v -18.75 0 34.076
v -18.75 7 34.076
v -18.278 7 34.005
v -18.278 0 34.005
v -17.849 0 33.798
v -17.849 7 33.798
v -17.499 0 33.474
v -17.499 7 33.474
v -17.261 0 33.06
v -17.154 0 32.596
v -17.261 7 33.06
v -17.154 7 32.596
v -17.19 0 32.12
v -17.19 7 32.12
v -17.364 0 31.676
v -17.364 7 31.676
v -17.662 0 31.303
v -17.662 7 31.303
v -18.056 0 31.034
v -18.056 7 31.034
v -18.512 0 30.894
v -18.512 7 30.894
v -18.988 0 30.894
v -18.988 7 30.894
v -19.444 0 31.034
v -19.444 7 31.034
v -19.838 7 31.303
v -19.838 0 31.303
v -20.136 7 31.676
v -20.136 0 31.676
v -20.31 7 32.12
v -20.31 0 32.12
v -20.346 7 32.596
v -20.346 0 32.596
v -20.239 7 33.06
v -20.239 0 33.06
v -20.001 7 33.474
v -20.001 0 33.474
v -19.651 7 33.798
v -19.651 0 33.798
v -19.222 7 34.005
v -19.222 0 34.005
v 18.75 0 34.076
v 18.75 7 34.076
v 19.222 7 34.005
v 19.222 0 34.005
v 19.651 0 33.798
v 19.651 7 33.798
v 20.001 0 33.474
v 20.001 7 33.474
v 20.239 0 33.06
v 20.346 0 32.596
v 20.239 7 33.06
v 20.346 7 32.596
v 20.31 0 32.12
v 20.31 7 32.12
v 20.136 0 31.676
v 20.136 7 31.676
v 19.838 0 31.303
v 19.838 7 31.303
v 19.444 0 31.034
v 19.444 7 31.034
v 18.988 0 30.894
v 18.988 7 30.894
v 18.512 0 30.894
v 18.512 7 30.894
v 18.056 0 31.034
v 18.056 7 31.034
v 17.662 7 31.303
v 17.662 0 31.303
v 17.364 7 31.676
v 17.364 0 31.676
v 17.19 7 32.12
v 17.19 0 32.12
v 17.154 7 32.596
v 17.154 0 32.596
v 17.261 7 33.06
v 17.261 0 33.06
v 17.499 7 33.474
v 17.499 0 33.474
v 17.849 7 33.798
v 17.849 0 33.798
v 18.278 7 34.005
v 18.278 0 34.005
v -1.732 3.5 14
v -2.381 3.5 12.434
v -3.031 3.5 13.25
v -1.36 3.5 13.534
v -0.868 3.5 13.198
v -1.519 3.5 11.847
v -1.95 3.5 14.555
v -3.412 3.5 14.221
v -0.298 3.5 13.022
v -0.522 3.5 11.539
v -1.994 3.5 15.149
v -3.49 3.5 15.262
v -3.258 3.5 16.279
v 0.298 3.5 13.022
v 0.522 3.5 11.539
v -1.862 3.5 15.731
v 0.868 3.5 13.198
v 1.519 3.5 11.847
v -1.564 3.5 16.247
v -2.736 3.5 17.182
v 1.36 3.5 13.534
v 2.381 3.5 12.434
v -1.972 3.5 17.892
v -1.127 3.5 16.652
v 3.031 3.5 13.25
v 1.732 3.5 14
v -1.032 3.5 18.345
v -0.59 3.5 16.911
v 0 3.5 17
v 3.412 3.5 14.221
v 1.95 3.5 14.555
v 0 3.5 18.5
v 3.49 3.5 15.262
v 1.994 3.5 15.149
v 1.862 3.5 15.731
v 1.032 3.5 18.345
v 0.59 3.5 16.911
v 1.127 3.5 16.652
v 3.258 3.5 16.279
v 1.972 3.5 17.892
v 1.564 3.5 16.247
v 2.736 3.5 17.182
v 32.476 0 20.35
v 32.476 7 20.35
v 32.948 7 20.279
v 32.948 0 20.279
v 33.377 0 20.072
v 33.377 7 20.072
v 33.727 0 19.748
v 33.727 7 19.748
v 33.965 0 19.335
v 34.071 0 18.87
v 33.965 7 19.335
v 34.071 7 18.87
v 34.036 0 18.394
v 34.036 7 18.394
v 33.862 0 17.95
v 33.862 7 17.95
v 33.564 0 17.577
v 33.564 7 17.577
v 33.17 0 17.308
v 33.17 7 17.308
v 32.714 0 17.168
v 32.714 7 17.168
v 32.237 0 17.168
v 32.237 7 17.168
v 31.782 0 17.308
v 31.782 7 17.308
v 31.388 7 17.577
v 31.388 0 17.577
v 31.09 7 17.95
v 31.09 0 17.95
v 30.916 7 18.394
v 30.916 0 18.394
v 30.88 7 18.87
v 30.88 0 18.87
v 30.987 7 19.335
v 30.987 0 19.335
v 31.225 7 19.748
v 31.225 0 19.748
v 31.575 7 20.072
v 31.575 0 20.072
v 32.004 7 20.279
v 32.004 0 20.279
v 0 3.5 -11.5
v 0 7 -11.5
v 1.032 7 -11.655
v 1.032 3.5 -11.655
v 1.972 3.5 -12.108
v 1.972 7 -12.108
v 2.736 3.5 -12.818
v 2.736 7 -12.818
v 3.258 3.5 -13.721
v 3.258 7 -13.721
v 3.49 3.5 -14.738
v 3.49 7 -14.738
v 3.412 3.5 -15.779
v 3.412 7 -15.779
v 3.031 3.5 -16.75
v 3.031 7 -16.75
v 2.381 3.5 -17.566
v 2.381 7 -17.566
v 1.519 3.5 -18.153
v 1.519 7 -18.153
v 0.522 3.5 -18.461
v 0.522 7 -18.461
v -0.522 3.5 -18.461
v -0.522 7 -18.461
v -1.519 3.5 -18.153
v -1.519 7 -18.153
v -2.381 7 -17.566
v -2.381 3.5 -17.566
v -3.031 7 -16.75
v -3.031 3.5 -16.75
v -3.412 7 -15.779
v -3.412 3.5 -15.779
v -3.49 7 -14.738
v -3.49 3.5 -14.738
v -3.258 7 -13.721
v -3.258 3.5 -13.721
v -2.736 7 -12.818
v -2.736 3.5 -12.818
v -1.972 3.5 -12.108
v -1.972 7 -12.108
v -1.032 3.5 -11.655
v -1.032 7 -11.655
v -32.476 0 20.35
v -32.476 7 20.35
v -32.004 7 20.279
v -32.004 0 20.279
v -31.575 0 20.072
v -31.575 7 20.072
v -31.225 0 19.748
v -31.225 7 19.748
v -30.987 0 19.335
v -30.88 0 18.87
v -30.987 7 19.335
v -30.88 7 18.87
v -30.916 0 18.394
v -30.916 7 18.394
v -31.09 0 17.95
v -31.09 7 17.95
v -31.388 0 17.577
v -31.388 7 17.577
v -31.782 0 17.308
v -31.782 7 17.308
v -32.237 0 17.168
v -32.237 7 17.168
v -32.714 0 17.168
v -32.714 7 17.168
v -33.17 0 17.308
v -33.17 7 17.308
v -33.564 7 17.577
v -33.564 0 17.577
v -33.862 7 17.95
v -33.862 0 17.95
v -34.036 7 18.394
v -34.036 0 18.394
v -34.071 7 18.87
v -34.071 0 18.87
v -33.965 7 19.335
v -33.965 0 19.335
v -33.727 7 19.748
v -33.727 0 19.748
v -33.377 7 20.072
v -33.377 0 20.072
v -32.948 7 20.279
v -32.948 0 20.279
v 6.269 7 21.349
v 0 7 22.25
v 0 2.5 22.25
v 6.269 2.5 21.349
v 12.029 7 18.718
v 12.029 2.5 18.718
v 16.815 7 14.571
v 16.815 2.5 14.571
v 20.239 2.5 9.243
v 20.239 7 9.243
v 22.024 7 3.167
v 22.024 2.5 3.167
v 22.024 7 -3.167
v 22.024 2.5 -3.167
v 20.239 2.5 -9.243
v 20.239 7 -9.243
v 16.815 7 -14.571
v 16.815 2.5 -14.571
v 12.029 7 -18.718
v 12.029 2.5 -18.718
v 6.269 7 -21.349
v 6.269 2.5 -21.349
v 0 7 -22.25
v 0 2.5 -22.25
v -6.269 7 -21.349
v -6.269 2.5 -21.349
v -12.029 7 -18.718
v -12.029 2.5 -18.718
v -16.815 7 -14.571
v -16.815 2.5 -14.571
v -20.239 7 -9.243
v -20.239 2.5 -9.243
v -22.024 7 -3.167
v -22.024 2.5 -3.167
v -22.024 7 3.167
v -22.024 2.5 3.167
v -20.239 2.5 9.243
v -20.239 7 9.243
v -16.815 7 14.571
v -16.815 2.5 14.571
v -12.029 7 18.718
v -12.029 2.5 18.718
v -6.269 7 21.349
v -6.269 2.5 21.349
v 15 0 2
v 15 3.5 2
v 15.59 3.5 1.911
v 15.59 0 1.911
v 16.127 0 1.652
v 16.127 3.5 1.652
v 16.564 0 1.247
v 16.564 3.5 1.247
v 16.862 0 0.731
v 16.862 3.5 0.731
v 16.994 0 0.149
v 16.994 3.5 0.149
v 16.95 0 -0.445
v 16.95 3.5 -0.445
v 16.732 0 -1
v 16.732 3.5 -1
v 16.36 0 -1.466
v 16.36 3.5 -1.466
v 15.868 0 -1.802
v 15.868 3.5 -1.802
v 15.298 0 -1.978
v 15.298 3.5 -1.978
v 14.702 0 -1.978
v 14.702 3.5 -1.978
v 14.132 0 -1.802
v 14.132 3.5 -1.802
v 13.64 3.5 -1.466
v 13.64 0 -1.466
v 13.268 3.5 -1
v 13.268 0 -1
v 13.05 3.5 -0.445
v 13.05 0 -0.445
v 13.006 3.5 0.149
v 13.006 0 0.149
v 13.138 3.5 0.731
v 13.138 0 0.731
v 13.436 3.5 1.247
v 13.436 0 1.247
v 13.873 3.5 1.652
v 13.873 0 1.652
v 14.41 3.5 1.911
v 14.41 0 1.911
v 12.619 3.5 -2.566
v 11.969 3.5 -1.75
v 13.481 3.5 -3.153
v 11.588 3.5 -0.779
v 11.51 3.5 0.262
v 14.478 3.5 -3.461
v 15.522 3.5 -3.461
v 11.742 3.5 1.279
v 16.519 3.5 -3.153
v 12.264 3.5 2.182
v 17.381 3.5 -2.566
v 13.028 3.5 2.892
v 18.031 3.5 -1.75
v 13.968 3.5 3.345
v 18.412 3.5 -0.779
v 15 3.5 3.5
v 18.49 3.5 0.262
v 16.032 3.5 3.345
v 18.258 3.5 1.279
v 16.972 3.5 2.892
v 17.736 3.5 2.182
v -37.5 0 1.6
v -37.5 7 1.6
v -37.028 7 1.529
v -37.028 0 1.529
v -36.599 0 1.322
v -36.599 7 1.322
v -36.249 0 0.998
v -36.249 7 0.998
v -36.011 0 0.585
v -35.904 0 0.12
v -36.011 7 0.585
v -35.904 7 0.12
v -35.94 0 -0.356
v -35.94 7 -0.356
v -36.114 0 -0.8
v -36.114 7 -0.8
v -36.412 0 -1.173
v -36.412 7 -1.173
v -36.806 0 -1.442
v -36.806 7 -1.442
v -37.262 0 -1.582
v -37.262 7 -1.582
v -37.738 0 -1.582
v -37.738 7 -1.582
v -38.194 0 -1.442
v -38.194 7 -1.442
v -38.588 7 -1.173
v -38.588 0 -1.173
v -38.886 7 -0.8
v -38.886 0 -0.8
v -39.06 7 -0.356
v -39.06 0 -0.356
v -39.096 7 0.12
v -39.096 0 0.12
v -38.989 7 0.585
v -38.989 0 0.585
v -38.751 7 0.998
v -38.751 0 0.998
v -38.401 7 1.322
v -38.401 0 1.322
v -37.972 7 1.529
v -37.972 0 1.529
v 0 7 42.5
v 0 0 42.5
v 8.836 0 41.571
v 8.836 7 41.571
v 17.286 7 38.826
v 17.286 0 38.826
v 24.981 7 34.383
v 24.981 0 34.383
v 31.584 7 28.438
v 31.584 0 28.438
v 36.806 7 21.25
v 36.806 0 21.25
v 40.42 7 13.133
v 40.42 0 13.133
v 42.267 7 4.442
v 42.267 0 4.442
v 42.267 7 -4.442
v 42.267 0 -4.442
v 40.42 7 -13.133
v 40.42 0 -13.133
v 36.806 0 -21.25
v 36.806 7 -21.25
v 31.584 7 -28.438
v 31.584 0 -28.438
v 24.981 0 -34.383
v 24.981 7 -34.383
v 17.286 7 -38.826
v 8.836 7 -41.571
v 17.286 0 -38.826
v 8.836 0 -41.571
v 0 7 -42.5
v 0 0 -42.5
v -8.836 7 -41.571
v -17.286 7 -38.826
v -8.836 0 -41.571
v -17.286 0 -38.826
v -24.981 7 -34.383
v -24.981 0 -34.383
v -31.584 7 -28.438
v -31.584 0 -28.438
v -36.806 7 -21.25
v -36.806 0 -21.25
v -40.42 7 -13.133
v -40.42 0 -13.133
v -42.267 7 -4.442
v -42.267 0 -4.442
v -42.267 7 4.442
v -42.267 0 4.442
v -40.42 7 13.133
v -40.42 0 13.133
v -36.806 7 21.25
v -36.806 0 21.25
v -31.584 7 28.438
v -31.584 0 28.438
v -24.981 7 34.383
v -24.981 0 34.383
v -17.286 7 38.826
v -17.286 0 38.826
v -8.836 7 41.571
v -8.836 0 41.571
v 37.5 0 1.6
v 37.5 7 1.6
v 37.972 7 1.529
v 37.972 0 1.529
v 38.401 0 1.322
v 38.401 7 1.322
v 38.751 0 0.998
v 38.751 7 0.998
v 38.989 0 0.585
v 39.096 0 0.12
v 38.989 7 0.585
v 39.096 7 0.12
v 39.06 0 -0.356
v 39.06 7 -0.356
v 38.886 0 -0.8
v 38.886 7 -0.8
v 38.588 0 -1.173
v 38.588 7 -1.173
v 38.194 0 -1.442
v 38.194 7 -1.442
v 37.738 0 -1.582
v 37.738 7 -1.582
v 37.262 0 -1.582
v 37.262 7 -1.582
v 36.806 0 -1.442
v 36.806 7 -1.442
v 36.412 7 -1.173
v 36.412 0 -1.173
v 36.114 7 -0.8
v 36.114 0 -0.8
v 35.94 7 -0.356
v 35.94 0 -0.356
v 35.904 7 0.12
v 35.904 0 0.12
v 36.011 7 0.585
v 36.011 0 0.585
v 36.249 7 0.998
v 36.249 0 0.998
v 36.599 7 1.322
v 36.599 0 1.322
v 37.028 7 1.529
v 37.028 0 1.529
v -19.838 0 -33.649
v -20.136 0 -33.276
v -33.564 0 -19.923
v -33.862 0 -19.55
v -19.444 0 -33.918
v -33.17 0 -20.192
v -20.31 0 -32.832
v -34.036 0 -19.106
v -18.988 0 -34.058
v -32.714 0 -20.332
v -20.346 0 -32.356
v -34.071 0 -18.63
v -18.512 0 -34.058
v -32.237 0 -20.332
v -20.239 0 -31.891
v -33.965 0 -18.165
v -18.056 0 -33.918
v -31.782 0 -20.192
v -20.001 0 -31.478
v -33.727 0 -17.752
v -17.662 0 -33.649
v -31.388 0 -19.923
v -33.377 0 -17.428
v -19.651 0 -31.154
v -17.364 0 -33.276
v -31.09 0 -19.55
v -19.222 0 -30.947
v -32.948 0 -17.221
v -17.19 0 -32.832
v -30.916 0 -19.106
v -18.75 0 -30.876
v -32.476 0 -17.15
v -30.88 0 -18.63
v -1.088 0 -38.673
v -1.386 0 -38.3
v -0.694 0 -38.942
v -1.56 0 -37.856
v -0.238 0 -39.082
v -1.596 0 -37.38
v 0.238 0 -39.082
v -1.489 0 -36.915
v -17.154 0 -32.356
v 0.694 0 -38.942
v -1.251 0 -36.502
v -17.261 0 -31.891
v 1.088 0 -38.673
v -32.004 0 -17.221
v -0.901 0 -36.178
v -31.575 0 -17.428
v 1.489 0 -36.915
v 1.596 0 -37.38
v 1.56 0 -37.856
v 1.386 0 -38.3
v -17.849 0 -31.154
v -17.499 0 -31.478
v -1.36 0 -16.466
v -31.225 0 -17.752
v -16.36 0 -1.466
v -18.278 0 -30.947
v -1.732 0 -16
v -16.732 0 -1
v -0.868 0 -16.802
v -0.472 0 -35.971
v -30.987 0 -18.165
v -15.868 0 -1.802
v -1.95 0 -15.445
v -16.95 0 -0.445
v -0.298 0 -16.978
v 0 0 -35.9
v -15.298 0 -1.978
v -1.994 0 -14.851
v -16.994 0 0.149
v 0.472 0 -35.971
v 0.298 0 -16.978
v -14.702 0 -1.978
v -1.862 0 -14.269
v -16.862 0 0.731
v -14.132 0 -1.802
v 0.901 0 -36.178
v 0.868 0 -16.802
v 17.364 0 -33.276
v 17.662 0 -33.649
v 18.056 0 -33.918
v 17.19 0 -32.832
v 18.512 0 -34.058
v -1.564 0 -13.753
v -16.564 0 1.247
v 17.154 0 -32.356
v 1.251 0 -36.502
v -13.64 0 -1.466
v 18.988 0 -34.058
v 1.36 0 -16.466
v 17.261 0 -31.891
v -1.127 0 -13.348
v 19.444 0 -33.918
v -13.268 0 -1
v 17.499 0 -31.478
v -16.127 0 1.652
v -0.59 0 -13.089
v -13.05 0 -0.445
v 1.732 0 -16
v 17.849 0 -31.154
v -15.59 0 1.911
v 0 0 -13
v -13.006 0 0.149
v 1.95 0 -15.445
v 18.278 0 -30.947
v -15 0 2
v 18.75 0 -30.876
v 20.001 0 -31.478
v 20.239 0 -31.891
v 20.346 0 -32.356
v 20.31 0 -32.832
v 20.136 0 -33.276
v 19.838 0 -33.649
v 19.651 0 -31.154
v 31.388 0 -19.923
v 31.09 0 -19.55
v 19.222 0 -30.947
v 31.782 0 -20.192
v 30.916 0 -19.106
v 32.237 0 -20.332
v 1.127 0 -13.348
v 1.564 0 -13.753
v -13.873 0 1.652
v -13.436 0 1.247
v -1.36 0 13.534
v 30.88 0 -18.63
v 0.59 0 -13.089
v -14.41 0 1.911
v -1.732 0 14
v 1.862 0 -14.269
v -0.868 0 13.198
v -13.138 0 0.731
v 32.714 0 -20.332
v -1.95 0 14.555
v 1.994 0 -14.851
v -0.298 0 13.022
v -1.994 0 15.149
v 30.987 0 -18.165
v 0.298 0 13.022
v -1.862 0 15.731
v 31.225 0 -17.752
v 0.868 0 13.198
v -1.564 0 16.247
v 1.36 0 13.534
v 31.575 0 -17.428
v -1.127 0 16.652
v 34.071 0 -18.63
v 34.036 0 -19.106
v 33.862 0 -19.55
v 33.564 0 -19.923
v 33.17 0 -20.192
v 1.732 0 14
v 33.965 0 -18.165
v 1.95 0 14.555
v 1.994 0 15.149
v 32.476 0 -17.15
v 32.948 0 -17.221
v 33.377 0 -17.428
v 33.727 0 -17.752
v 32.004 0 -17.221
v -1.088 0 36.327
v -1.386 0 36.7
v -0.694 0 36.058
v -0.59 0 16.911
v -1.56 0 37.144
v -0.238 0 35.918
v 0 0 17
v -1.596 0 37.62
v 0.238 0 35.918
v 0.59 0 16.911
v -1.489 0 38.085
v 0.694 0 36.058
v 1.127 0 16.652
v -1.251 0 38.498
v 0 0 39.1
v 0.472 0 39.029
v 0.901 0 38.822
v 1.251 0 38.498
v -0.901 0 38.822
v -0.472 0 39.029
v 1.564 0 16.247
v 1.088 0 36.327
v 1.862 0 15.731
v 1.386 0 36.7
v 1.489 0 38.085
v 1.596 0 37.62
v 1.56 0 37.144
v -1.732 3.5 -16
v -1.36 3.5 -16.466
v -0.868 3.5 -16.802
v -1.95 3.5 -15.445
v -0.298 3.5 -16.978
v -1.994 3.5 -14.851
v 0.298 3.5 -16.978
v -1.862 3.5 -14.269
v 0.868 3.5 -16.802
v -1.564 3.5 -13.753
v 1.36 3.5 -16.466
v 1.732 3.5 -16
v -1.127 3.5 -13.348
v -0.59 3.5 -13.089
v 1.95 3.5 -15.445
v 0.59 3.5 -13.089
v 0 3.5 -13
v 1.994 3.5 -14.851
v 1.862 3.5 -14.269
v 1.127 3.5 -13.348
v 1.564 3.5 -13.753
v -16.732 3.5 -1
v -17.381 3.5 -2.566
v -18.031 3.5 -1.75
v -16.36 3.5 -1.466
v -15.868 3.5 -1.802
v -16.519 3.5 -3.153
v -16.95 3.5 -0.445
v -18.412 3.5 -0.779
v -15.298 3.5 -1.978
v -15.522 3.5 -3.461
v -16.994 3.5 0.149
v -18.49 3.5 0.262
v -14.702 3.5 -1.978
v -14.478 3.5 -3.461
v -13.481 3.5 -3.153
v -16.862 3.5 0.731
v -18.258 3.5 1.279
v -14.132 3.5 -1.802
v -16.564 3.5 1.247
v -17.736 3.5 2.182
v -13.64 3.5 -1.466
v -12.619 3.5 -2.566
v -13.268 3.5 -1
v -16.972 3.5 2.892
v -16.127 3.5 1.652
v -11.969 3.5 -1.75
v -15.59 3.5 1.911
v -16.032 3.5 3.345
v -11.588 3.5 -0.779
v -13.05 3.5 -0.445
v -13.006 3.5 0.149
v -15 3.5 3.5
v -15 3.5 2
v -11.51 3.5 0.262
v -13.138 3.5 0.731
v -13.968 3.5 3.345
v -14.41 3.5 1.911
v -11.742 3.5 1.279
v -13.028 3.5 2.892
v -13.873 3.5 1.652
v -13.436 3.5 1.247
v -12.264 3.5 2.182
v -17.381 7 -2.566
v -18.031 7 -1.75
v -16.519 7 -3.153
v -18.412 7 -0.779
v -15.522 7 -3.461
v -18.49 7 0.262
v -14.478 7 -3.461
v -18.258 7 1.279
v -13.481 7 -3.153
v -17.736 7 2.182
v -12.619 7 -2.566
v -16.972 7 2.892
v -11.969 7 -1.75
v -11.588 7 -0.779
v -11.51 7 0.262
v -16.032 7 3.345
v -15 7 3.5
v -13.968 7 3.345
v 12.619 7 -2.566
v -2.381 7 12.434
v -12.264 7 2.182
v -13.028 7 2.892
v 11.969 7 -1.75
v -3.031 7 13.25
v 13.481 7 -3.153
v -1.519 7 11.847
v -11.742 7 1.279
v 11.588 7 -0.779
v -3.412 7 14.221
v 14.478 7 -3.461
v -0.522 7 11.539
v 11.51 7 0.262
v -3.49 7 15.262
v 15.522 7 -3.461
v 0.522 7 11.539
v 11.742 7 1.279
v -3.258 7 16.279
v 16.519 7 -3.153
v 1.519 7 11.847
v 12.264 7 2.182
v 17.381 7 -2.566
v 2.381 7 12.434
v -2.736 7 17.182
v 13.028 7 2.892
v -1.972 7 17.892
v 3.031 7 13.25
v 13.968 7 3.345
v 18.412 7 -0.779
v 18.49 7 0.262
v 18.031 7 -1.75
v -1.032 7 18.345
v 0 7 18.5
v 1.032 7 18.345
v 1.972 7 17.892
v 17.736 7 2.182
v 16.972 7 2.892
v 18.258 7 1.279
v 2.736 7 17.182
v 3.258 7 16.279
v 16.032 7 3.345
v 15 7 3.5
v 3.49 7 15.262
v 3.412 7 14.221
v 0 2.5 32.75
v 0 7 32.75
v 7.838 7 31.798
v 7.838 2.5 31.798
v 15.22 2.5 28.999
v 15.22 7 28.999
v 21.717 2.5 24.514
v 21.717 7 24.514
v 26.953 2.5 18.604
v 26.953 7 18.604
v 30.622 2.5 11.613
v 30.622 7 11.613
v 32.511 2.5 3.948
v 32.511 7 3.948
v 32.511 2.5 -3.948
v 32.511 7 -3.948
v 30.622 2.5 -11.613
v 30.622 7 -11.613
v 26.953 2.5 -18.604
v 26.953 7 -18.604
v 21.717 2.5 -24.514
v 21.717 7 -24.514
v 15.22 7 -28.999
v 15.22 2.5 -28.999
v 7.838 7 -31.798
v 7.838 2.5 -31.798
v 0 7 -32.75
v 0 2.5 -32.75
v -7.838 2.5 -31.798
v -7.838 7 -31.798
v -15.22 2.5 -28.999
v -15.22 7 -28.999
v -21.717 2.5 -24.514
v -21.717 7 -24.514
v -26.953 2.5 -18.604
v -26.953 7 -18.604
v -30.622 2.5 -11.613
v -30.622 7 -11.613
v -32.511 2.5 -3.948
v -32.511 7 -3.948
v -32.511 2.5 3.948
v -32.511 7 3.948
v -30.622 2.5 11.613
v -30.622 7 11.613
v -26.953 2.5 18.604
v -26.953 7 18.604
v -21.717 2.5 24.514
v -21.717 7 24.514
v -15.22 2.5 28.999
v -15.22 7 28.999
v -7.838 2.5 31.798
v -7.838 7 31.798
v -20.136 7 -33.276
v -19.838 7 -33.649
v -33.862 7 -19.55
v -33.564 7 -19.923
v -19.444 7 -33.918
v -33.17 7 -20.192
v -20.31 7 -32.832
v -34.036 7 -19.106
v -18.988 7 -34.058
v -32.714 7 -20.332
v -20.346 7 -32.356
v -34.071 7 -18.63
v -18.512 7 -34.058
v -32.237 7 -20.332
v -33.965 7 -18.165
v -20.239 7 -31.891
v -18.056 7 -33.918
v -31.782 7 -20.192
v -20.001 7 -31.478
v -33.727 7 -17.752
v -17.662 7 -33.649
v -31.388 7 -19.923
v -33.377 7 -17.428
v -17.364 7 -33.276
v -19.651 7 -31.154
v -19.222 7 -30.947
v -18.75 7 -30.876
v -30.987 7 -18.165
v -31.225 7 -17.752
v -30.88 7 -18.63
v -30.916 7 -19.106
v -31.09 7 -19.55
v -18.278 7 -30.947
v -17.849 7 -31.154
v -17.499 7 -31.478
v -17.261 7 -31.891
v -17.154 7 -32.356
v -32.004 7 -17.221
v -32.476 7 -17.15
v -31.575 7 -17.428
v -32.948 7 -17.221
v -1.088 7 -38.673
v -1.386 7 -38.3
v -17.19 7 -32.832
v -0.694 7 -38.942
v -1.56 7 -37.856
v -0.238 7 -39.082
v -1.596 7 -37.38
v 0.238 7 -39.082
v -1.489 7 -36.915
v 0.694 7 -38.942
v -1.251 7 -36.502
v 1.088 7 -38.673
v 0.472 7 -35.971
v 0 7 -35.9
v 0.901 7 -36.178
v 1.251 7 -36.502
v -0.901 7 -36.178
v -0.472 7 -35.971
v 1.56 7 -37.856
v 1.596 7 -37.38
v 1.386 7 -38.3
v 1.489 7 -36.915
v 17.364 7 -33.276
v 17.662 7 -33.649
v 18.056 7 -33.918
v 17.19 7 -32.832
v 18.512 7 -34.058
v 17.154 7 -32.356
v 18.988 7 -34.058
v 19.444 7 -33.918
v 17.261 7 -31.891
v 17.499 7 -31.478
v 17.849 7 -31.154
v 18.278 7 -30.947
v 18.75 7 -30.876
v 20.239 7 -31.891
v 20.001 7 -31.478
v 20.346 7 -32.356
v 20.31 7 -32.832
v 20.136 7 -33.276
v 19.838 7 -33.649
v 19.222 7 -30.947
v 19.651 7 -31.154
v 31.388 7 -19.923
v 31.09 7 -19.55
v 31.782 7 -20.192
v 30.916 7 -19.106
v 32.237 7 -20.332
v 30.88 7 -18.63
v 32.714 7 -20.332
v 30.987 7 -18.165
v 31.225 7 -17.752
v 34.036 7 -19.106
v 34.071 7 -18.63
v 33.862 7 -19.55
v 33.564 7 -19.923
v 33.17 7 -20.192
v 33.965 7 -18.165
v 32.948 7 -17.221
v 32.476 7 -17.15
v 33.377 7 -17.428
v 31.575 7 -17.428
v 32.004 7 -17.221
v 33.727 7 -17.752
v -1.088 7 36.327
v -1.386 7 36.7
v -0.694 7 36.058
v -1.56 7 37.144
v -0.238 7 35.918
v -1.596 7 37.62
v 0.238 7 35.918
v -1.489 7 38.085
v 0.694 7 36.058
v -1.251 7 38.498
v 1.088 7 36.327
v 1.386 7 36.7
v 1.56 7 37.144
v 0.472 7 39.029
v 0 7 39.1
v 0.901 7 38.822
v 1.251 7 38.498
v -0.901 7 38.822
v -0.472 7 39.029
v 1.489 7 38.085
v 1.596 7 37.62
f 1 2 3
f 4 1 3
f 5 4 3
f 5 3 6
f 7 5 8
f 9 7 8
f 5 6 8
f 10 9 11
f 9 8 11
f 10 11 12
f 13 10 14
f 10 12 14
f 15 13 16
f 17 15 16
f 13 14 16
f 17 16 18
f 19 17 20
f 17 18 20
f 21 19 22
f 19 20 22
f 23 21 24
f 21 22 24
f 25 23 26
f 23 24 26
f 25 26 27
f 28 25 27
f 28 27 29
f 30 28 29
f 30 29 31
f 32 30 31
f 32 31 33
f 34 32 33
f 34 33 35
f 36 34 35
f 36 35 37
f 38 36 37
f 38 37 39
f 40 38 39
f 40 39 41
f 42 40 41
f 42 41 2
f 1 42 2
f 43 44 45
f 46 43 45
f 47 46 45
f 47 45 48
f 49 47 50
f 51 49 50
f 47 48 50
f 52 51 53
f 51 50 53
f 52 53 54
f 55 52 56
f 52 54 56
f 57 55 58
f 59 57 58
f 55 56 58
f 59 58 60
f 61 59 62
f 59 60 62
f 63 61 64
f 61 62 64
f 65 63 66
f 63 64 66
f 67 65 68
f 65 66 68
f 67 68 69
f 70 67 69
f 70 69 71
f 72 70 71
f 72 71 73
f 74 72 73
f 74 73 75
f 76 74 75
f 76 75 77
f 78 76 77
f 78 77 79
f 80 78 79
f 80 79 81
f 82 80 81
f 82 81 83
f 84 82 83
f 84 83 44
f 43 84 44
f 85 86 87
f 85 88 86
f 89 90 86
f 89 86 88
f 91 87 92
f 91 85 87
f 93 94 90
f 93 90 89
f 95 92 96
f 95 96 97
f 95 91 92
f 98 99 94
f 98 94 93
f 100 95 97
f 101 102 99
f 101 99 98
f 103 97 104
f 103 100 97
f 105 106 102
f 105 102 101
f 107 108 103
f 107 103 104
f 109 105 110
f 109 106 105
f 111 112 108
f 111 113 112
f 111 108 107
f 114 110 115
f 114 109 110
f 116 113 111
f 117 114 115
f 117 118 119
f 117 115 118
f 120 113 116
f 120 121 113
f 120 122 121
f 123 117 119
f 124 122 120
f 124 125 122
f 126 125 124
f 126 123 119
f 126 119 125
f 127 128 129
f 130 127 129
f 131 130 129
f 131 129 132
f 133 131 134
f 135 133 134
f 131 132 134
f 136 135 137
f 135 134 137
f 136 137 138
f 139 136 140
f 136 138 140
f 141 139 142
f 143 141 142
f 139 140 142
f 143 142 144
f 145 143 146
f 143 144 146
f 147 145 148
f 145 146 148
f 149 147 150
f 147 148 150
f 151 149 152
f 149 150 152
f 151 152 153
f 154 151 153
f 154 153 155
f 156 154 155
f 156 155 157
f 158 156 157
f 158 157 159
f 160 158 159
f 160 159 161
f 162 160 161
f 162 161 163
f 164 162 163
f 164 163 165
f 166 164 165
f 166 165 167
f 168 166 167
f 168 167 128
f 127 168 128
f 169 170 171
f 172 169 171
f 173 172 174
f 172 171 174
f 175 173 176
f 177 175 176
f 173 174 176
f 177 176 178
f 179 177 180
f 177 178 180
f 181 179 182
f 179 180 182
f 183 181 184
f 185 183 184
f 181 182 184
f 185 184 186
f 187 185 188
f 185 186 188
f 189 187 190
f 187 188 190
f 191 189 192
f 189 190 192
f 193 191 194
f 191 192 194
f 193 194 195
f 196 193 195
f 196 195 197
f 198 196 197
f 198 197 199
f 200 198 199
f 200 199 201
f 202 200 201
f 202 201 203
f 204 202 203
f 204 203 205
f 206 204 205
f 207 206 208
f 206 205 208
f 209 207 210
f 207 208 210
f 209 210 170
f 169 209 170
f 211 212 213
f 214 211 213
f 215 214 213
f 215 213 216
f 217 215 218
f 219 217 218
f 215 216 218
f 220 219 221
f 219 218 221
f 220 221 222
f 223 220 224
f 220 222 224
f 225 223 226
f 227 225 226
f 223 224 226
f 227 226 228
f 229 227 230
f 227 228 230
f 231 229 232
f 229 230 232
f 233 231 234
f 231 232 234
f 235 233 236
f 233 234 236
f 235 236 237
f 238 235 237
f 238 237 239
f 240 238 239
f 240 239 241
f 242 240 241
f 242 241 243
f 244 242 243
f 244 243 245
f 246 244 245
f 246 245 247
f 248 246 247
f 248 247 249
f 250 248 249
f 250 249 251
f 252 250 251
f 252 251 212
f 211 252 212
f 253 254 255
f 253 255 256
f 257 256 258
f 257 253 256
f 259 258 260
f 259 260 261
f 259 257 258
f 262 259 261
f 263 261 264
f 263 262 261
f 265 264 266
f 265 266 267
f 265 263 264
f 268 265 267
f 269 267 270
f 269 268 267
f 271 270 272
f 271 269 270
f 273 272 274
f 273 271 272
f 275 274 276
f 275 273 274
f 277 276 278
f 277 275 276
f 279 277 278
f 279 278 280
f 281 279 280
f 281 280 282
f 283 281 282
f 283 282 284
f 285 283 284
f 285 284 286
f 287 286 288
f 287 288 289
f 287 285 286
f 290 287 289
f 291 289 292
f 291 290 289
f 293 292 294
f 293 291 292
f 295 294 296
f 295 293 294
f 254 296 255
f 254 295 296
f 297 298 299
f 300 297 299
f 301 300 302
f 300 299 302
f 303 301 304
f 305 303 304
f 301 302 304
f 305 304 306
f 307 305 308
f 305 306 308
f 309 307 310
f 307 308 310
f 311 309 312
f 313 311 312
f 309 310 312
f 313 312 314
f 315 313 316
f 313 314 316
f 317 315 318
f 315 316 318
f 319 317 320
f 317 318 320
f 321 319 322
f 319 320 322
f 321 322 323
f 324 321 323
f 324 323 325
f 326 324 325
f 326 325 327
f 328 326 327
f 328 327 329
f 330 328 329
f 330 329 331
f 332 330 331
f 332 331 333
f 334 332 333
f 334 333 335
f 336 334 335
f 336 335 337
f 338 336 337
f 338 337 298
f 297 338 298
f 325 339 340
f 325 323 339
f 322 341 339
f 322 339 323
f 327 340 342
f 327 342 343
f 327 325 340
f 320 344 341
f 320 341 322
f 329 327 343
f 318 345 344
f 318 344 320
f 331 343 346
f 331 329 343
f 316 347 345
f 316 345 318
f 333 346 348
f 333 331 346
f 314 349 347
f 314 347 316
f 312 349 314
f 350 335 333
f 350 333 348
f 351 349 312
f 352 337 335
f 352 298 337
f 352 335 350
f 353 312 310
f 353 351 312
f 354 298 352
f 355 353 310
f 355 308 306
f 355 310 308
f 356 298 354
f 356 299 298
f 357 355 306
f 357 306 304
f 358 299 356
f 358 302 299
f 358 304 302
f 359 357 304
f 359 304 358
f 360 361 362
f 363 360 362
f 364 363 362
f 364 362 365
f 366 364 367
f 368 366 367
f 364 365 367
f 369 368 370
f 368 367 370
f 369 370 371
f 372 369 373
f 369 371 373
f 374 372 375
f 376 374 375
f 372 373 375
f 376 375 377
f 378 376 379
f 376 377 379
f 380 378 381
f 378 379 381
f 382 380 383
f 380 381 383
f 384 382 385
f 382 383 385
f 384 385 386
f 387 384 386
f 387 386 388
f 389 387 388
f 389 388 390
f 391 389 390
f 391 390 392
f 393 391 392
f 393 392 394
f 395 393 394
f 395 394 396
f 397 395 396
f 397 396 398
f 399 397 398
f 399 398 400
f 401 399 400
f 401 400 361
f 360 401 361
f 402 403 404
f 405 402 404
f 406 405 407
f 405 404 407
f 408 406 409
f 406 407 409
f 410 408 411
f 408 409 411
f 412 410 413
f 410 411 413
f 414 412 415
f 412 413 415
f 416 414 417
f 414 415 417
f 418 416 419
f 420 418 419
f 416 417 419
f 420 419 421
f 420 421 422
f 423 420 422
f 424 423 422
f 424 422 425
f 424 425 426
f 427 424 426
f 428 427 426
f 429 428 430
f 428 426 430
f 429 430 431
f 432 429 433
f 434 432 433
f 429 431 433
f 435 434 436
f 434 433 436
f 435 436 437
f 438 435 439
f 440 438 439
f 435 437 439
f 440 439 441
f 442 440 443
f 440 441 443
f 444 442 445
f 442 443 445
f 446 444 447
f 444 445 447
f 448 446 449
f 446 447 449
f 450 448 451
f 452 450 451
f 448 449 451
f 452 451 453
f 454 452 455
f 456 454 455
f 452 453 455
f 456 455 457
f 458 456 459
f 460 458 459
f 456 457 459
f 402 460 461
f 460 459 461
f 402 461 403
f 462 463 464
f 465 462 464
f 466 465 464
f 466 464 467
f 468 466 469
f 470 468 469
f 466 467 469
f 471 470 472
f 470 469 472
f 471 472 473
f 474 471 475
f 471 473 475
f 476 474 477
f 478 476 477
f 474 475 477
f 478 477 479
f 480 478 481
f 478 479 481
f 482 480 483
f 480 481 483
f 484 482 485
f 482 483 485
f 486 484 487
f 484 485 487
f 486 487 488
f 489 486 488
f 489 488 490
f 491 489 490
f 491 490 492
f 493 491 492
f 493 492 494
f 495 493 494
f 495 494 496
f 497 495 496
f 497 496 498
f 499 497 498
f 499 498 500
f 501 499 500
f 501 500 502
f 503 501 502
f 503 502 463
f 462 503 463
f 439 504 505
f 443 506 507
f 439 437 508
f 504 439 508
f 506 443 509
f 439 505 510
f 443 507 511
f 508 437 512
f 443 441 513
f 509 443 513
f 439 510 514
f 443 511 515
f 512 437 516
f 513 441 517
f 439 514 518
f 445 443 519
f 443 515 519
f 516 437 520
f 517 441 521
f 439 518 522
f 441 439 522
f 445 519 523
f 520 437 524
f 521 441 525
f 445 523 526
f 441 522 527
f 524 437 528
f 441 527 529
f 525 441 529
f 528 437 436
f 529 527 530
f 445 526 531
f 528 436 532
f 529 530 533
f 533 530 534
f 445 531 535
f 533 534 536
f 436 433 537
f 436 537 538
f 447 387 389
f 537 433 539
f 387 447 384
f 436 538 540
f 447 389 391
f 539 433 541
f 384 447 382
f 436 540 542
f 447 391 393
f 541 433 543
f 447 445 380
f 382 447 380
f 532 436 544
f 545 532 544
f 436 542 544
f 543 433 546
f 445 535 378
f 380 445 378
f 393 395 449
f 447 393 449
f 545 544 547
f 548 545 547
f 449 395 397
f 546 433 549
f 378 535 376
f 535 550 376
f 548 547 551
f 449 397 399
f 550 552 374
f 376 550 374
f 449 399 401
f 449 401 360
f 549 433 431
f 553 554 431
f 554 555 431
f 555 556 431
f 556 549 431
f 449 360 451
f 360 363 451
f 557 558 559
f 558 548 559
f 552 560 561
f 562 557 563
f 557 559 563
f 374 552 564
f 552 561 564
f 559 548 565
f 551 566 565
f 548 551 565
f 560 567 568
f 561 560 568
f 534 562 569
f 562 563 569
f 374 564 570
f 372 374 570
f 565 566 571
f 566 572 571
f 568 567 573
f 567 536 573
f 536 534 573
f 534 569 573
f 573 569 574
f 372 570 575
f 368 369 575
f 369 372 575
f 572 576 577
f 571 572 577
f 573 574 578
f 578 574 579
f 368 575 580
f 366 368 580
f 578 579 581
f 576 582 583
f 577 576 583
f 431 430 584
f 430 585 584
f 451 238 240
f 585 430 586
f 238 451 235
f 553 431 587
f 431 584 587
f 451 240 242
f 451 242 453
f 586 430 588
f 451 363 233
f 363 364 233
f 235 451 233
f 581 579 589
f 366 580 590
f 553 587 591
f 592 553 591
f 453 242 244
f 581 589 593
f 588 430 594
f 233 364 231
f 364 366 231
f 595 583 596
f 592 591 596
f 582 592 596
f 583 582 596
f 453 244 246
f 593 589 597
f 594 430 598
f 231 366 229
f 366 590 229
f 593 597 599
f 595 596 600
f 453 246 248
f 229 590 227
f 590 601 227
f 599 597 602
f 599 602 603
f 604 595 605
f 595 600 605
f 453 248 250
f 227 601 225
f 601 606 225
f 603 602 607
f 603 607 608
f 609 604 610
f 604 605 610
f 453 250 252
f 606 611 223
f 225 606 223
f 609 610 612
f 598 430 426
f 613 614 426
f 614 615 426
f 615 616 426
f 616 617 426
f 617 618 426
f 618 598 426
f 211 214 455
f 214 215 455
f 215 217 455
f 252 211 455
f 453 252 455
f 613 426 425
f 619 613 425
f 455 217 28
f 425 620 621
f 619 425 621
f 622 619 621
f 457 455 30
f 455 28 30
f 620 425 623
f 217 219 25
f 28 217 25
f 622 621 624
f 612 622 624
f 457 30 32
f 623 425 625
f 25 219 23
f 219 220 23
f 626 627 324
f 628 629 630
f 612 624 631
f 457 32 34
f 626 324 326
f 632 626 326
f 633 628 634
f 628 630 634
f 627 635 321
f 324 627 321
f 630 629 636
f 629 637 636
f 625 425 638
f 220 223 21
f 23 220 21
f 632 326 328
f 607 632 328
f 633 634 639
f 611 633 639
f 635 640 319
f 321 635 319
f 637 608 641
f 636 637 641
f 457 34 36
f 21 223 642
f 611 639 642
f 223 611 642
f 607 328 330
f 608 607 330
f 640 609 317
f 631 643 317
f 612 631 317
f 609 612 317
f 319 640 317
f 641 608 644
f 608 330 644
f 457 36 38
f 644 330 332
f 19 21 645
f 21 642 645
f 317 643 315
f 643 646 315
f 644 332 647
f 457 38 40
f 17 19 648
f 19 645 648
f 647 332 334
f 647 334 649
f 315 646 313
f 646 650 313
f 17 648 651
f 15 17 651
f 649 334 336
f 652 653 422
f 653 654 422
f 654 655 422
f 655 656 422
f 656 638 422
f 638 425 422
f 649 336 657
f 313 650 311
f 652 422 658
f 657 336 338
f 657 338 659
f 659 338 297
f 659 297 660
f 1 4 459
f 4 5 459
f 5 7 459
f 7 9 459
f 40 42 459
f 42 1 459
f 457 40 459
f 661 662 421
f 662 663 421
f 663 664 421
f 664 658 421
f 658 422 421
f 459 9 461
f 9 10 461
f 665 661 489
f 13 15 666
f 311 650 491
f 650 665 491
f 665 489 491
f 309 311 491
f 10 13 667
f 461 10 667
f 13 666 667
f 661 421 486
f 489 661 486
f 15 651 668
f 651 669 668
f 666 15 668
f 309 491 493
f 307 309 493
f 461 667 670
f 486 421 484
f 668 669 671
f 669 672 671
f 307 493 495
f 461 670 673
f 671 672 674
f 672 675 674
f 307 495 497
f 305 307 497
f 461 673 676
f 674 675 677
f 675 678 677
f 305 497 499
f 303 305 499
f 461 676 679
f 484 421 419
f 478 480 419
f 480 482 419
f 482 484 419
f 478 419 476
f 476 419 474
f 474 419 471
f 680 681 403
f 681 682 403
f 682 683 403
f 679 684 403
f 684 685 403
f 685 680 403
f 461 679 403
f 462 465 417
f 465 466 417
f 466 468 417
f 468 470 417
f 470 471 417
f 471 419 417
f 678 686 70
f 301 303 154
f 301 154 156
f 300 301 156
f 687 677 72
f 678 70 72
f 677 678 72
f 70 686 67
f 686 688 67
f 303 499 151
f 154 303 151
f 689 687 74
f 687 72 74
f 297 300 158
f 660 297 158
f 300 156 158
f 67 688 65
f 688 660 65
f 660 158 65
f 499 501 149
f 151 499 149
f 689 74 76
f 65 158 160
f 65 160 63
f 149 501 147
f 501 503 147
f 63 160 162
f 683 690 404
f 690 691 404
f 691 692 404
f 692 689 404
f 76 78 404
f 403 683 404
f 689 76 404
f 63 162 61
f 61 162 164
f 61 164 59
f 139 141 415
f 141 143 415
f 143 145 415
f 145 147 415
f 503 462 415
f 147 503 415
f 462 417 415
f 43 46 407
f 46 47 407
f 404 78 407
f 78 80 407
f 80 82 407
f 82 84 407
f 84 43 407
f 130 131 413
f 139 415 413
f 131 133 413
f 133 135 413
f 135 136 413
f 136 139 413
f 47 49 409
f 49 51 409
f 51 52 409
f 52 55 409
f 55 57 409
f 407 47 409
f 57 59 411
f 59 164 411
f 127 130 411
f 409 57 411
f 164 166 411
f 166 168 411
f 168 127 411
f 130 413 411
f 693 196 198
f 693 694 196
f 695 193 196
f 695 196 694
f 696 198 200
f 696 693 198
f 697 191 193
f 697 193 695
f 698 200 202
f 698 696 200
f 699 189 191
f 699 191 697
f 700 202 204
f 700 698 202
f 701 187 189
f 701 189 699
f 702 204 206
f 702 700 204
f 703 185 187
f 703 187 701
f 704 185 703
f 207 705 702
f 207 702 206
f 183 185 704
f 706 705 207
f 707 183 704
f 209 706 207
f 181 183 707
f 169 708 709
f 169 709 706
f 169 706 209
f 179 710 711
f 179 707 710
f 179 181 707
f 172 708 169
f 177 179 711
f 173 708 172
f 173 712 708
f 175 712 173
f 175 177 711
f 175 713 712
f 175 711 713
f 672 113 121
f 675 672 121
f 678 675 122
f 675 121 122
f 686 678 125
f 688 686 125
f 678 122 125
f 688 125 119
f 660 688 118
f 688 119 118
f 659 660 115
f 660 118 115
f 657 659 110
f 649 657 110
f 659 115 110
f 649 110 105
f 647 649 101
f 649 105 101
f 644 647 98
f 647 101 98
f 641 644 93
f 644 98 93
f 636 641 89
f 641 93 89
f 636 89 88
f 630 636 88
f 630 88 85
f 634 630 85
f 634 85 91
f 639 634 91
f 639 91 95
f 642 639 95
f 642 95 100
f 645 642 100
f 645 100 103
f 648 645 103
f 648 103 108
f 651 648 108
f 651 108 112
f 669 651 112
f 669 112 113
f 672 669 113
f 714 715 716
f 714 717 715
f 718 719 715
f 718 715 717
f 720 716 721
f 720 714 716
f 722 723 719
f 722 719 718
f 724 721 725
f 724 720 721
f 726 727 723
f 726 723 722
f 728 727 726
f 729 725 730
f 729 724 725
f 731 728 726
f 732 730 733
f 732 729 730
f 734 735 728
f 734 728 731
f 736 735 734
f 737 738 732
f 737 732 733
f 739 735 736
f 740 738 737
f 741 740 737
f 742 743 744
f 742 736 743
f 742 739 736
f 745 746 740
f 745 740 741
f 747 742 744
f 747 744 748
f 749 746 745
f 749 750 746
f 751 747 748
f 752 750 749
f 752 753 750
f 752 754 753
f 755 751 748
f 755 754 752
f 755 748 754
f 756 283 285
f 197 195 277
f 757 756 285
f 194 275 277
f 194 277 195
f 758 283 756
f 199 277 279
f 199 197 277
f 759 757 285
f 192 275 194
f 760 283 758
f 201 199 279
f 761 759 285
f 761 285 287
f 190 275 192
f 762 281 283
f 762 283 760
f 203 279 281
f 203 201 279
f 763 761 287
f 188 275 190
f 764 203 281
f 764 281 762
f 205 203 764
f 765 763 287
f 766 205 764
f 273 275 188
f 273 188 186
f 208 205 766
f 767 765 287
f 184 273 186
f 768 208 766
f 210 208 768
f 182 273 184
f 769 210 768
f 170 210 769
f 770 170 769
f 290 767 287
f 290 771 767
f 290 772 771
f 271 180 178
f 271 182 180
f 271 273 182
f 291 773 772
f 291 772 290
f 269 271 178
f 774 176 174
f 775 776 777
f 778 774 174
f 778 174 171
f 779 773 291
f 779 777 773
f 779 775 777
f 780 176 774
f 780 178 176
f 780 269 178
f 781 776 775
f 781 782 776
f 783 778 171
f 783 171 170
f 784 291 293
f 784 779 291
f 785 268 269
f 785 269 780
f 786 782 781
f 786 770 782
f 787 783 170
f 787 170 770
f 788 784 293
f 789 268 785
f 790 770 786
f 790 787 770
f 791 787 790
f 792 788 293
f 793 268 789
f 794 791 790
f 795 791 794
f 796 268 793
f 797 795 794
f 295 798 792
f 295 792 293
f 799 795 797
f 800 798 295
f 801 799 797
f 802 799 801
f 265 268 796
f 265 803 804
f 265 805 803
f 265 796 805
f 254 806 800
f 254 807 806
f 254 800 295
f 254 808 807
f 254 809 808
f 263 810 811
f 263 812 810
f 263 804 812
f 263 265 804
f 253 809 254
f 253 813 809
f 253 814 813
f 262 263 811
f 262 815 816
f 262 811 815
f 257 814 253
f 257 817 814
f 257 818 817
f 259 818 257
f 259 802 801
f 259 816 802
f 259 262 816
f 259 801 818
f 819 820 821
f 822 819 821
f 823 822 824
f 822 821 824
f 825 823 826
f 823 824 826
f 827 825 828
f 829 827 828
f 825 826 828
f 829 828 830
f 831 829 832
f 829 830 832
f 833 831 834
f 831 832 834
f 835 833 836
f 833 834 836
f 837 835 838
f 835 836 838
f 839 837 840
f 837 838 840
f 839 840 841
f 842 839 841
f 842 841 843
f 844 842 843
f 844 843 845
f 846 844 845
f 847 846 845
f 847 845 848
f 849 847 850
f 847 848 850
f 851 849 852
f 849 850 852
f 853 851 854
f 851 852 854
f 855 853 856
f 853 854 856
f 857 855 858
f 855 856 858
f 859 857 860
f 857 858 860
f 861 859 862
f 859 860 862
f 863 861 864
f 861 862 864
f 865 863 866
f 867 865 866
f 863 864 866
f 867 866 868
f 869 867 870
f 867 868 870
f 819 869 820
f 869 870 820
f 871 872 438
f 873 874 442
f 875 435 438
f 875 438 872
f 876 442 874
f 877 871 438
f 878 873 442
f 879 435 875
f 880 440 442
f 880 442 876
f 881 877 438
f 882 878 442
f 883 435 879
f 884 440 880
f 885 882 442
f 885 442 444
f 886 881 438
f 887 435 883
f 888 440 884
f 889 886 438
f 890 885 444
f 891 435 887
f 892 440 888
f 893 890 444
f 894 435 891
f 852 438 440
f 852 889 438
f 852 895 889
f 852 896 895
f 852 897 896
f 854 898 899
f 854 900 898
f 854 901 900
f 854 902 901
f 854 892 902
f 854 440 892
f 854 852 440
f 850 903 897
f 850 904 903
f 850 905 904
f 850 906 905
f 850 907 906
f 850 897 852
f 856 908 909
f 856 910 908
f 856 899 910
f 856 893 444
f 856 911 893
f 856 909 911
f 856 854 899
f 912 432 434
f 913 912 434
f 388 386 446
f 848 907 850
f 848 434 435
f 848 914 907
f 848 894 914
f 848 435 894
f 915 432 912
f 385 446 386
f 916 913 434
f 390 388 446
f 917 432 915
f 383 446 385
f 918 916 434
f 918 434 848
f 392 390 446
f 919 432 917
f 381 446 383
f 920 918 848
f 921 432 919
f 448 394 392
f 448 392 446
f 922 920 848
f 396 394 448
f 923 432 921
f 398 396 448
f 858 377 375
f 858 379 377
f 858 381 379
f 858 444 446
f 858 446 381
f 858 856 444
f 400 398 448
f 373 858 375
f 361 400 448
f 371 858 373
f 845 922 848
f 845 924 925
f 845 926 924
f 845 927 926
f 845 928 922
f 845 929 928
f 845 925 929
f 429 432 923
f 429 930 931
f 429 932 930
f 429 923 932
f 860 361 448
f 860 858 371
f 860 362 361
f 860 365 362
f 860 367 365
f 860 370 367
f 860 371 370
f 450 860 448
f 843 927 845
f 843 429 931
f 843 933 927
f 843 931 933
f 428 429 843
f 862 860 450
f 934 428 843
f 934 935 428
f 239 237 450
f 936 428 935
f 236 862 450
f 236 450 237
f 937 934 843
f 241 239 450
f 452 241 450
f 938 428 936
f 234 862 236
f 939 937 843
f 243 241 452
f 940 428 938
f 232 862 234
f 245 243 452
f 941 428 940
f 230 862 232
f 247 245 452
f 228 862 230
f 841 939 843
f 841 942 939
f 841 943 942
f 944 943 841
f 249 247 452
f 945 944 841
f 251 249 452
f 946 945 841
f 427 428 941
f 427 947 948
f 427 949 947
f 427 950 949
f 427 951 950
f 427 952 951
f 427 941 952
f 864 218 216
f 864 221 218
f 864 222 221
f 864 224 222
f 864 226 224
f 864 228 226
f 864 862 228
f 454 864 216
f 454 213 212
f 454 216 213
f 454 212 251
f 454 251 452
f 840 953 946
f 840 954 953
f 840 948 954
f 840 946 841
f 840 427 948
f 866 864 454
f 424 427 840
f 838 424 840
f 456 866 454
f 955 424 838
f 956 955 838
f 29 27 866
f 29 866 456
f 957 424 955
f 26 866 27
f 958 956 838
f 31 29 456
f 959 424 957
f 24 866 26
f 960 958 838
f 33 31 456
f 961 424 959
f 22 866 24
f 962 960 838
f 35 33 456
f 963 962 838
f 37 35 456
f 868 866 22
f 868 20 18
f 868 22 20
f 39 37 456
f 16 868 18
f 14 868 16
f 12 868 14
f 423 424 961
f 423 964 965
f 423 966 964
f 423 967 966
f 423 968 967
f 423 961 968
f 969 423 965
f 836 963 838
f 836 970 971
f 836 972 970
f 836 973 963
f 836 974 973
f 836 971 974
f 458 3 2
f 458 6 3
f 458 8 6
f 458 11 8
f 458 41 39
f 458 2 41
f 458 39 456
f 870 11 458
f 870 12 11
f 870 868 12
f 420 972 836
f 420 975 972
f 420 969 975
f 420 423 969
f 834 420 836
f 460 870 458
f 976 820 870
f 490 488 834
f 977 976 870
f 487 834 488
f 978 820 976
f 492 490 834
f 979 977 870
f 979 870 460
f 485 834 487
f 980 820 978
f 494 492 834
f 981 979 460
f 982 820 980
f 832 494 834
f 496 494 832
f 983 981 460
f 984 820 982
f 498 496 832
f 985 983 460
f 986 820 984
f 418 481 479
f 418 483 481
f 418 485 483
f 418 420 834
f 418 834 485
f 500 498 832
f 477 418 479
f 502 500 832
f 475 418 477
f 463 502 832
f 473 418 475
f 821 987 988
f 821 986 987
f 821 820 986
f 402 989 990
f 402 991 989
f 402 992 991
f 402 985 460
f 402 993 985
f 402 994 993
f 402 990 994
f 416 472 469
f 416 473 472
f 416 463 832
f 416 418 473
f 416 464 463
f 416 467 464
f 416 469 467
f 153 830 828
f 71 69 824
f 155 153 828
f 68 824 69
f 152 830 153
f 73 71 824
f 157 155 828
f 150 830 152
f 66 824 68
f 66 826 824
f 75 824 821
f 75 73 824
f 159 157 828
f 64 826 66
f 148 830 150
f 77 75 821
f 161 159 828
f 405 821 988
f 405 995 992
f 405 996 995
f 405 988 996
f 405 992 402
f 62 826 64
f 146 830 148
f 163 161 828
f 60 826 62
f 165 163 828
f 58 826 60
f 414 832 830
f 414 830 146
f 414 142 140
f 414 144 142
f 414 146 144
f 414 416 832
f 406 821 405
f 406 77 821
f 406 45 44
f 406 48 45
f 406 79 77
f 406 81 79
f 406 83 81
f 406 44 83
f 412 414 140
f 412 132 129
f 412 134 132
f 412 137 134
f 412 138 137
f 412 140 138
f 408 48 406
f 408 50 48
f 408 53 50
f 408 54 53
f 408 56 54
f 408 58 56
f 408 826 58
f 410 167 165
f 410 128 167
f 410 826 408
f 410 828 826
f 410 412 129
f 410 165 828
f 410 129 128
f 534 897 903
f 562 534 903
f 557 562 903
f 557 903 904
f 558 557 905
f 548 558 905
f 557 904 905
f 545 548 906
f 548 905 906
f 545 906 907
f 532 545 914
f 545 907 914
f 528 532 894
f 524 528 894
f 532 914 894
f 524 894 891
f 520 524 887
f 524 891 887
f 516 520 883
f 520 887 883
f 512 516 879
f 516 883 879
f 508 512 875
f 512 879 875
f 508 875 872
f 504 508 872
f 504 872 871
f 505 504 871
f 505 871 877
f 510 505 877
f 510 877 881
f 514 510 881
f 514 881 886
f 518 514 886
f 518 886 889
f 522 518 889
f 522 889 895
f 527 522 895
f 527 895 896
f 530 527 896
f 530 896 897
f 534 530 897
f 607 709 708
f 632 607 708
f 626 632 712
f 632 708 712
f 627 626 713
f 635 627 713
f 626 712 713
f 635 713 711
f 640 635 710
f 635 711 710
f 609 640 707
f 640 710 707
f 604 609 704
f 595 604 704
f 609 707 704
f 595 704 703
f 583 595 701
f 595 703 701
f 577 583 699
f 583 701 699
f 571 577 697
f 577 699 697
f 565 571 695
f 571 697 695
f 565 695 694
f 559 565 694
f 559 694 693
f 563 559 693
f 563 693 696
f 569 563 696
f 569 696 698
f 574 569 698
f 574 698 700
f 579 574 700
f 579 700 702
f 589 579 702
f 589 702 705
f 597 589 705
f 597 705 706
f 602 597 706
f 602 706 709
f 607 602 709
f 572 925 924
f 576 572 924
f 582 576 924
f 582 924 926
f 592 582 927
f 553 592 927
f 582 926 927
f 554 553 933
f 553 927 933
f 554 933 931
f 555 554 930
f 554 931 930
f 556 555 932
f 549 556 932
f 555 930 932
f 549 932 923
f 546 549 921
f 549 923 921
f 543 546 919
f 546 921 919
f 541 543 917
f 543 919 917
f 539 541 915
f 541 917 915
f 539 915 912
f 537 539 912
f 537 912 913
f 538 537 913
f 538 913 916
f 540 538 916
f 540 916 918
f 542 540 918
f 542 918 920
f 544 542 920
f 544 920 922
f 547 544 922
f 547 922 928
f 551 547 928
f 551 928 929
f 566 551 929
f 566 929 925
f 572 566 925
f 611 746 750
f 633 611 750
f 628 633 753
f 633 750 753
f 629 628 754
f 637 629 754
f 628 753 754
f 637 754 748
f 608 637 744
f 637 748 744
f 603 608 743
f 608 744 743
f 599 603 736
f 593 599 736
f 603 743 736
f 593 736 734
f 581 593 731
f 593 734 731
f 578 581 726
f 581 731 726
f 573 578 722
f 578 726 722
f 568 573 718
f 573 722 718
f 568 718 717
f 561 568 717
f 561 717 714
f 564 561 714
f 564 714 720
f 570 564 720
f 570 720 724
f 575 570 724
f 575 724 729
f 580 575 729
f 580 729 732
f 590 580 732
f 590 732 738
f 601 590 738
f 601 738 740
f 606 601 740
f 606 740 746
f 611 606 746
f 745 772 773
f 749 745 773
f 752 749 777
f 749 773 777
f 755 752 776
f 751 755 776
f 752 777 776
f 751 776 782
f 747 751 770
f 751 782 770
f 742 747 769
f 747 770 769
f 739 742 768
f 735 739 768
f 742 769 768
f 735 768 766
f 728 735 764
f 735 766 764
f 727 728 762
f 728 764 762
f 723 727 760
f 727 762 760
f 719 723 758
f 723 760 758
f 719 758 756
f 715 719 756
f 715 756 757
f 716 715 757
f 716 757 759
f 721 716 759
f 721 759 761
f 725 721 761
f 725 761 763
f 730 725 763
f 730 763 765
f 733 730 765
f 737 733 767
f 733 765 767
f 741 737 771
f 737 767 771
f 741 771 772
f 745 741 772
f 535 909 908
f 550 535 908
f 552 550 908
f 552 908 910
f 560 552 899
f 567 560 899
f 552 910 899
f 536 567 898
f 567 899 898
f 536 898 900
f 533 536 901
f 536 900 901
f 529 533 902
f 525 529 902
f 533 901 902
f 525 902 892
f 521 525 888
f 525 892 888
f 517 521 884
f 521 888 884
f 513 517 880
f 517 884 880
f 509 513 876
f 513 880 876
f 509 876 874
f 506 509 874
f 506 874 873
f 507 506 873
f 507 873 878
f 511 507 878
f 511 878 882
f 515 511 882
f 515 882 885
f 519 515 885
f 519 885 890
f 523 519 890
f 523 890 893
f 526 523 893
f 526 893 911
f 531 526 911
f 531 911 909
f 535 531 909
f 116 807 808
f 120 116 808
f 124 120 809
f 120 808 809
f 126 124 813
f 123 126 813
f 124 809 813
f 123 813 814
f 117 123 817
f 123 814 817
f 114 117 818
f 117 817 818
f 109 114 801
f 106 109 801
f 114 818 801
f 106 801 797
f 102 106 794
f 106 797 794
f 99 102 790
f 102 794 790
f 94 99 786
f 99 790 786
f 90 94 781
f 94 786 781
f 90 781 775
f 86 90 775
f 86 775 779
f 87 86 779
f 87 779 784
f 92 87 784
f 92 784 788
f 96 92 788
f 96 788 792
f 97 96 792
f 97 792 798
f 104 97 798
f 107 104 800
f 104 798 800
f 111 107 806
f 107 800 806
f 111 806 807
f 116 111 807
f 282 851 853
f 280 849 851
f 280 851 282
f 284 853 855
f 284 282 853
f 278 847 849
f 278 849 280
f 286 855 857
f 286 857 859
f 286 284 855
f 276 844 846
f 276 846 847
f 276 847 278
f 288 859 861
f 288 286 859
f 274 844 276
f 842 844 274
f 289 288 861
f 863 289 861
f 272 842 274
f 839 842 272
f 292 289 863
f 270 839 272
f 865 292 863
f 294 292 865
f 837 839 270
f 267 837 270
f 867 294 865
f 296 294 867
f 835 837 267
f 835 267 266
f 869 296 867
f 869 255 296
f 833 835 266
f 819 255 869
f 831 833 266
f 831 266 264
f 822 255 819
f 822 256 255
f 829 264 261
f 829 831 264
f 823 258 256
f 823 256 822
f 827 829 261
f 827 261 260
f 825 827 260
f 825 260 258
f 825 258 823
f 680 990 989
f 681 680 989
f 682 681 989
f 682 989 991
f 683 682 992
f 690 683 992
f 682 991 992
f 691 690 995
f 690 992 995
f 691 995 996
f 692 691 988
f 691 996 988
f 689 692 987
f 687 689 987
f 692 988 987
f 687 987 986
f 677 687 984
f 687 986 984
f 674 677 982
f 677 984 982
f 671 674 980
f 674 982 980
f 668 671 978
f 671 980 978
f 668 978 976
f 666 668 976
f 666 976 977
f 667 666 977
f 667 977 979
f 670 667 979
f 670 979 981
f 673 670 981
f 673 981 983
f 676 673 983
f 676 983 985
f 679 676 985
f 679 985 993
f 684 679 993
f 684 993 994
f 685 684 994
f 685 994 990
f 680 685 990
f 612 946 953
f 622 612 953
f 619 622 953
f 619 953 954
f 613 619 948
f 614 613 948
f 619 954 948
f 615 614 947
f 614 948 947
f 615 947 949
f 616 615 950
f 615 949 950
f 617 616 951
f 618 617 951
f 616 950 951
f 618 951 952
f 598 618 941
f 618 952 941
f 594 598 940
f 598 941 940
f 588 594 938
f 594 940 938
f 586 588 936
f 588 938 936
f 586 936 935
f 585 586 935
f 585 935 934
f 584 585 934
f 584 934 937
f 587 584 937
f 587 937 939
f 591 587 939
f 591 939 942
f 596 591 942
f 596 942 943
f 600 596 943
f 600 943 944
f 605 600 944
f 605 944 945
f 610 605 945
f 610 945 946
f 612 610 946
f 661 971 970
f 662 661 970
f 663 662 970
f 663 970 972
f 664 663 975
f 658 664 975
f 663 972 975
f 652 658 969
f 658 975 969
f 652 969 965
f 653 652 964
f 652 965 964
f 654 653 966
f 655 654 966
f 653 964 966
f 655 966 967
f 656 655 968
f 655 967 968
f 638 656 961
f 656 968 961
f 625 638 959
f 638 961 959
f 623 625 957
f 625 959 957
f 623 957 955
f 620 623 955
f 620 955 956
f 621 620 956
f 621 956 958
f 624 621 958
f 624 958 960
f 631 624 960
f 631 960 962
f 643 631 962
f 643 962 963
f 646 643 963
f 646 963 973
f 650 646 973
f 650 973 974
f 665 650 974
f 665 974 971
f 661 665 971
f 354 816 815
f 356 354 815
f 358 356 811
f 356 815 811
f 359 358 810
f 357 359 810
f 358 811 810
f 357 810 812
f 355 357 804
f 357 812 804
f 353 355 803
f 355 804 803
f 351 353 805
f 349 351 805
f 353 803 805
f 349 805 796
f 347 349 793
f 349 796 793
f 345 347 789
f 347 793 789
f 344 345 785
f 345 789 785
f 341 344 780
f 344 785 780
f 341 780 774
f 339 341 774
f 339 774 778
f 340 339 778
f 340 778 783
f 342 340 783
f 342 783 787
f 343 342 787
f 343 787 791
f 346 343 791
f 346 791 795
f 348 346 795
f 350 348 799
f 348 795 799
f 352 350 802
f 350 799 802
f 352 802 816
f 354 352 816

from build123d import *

# Parameters (mm, degrees)
SKETCH1_R           = 42.5
BOSS_EXTRUDE1_DEPTH = 7
SKETCH2_R           = 32.75
SKETCH2_R_2         = 22.25
CUT_EXTRUDE1_DEPTH  = 4.5
SKETCH3_R           = 1.6
CUT_EXTRUDE2_DEPTH  = 61.510329697
SKETCH4_R           = 2
CUT_EXTRUDE3_DEPTH  = 61.510329697
SKETCH5_R           = 3.5
SKETCH5_R_2         = 2
CUT_EXTRUDE4_DEPTH  = 3.5


with BuildPart() as part:
    # Sketch1 → Boss-Extrude1 (new body)
    with BuildSketch(Plane(origin=(0, 0, 0), x_dir=(1, 0, 0), z_dir=(0, 1, 0))):
        with Locations(Location((0, 0, 0), (0, 0, 270))):
            Circle(SKETCH1_R)
    extrude(amount=BOSS_EXTRUDE1_DEPTH)

    # Sketch2 → Cut-Extrude1 (cut)
    with BuildSketch(Plane(origin=(0, 7, 0), x_dir=(1, 0, 0), z_dir=(0, 1, 0))):
        with Locations(Location((0, 0, 0), (0, 0, 270))):
            Circle(SKETCH2_R)
        with Locations(Location((0, 0, 0), (0, 0, 270))):
            Circle(SKETCH2_R_2, mode=Mode.SUBTRACT)
    extrude(amount=-CUT_EXTRUDE1_DEPTH, mode=Mode.SUBTRACT)

    # Sketch3 → Cut-Extrude2 (cut, through all)
    with BuildSketch(Plane(origin=(0, 7, 0), x_dir=(1, 0, 0), z_dir=(0, 1, 0))):
        with Locations(Location((0, 37.5, 0), (0, 0, 270))):
            Circle(SKETCH3_R)
        with Locations(Location((18.75, 32.475952642, 0), (0, 0, 270))):
            Circle(SKETCH3_R)
        with Locations(Location((32.475952642, 18.75, 0), (0, 0, 270))):
            Circle(SKETCH3_R)
        with Locations(Location((37.5, 0, 0), (0, 0, 270))):
            Circle(SKETCH3_R)
        with Locations(Location((32.475952642, -18.75, 0), (0, 0, 270))):
            Circle(SKETCH3_R)
        with Locations(Location((18.75, -32.475952642, 0), (0, 0, 270))):
            Circle(SKETCH3_R)
        with Locations(Location((0, -37.5, 0), (0, 0, 270))):
            Circle(SKETCH3_R)
        with Locations(Location((-18.75, -32.475952642, 0), (0, 0, 270))):
            Circle(SKETCH3_R)
        with Locations(Location((-32.475952642, -18.75, 0), (0, 0, 270))):
            Circle(SKETCH3_R)
        with Locations(Location((-37.5, 0, 0), (0, 0, 270))):
            Circle(SKETCH3_R)
        with Locations(Location((-32.475952642, 18.75, 0), (0, 0, 270))):
            Circle(SKETCH3_R)
        with Locations(Location((-18.75, 32.475952642, 0), (0, 0, 270))):
            Circle(SKETCH3_R)
    extrude(amount=-CUT_EXTRUDE2_DEPTH, mode=Mode.SUBTRACT)

    # Sketch4 → Cut-Extrude3 (cut, through all)
    with BuildSketch(Plane(origin=(0, 7, 0), x_dir=(1, 0, 0), z_dir=(0, 1, 0))):
        with Locations(Location((0, 15, 0), (0, 0, 270))):
            Circle(SKETCH4_R)
        with Locations(Location((15, 0, 0), (0, 0, 270))):
            Circle(SKETCH4_R)
        with Locations(Location((0, -15, 0), (0, 0, 270))):
            Circle(SKETCH4_R)
        with Locations(Location((-15, 0, 0), (0, 0, 270))):
            Circle(SKETCH4_R)
    extrude(amount=-CUT_EXTRUDE3_DEPTH, mode=Mode.SUBTRACT)

    # Sketch5 → Cut-Extrude4 (cut)
    # profile 1 of 4: a face of its own
    with BuildSketch(Plane(origin=(0, 7, 0), x_dir=(1, 0, 0), z_dir=(0, 1, 0))):
        with Locations(Location((0, 15, 0), (0, 0, 270))):
            Circle(SKETCH5_R)
        with Locations(Location((0, 15, 0), (0, 0, 270))):
            Circle(SKETCH5_R_2, mode=Mode.SUBTRACT)
    # profile 2 of 4: a face of its own
    with BuildSketch(Plane(origin=(0, 7, 0), x_dir=(1, 0, 0), z_dir=(0, 1, 0))):
        with Locations(Location((15, 0, 0), (0, 0, 270))):
            Circle(SKETCH5_R)
    # profile 3 of 4: a face of its own
    with BuildSketch(Plane(origin=(0, 7, 0), x_dir=(1, 0, 0), z_dir=(0, 1, 0))):
        with Locations(Location((0, -15, 0), (0, 0, 270))):
            Circle(SKETCH5_R)
    # profile 4 of 4: a face of its own
    with BuildSketch(Plane(origin=(0, 7, 0), x_dir=(1, 0, 0), z_dir=(0, 1, 0))):
        with Locations(Location((-15, 0, 0), (0, 0, 270))):
            Circle(SKETCH5_R)
    extrude(amount=-CUT_EXTRUDE4_DEPTH, mode=Mode.SUBTRACT)


solid = part.part
